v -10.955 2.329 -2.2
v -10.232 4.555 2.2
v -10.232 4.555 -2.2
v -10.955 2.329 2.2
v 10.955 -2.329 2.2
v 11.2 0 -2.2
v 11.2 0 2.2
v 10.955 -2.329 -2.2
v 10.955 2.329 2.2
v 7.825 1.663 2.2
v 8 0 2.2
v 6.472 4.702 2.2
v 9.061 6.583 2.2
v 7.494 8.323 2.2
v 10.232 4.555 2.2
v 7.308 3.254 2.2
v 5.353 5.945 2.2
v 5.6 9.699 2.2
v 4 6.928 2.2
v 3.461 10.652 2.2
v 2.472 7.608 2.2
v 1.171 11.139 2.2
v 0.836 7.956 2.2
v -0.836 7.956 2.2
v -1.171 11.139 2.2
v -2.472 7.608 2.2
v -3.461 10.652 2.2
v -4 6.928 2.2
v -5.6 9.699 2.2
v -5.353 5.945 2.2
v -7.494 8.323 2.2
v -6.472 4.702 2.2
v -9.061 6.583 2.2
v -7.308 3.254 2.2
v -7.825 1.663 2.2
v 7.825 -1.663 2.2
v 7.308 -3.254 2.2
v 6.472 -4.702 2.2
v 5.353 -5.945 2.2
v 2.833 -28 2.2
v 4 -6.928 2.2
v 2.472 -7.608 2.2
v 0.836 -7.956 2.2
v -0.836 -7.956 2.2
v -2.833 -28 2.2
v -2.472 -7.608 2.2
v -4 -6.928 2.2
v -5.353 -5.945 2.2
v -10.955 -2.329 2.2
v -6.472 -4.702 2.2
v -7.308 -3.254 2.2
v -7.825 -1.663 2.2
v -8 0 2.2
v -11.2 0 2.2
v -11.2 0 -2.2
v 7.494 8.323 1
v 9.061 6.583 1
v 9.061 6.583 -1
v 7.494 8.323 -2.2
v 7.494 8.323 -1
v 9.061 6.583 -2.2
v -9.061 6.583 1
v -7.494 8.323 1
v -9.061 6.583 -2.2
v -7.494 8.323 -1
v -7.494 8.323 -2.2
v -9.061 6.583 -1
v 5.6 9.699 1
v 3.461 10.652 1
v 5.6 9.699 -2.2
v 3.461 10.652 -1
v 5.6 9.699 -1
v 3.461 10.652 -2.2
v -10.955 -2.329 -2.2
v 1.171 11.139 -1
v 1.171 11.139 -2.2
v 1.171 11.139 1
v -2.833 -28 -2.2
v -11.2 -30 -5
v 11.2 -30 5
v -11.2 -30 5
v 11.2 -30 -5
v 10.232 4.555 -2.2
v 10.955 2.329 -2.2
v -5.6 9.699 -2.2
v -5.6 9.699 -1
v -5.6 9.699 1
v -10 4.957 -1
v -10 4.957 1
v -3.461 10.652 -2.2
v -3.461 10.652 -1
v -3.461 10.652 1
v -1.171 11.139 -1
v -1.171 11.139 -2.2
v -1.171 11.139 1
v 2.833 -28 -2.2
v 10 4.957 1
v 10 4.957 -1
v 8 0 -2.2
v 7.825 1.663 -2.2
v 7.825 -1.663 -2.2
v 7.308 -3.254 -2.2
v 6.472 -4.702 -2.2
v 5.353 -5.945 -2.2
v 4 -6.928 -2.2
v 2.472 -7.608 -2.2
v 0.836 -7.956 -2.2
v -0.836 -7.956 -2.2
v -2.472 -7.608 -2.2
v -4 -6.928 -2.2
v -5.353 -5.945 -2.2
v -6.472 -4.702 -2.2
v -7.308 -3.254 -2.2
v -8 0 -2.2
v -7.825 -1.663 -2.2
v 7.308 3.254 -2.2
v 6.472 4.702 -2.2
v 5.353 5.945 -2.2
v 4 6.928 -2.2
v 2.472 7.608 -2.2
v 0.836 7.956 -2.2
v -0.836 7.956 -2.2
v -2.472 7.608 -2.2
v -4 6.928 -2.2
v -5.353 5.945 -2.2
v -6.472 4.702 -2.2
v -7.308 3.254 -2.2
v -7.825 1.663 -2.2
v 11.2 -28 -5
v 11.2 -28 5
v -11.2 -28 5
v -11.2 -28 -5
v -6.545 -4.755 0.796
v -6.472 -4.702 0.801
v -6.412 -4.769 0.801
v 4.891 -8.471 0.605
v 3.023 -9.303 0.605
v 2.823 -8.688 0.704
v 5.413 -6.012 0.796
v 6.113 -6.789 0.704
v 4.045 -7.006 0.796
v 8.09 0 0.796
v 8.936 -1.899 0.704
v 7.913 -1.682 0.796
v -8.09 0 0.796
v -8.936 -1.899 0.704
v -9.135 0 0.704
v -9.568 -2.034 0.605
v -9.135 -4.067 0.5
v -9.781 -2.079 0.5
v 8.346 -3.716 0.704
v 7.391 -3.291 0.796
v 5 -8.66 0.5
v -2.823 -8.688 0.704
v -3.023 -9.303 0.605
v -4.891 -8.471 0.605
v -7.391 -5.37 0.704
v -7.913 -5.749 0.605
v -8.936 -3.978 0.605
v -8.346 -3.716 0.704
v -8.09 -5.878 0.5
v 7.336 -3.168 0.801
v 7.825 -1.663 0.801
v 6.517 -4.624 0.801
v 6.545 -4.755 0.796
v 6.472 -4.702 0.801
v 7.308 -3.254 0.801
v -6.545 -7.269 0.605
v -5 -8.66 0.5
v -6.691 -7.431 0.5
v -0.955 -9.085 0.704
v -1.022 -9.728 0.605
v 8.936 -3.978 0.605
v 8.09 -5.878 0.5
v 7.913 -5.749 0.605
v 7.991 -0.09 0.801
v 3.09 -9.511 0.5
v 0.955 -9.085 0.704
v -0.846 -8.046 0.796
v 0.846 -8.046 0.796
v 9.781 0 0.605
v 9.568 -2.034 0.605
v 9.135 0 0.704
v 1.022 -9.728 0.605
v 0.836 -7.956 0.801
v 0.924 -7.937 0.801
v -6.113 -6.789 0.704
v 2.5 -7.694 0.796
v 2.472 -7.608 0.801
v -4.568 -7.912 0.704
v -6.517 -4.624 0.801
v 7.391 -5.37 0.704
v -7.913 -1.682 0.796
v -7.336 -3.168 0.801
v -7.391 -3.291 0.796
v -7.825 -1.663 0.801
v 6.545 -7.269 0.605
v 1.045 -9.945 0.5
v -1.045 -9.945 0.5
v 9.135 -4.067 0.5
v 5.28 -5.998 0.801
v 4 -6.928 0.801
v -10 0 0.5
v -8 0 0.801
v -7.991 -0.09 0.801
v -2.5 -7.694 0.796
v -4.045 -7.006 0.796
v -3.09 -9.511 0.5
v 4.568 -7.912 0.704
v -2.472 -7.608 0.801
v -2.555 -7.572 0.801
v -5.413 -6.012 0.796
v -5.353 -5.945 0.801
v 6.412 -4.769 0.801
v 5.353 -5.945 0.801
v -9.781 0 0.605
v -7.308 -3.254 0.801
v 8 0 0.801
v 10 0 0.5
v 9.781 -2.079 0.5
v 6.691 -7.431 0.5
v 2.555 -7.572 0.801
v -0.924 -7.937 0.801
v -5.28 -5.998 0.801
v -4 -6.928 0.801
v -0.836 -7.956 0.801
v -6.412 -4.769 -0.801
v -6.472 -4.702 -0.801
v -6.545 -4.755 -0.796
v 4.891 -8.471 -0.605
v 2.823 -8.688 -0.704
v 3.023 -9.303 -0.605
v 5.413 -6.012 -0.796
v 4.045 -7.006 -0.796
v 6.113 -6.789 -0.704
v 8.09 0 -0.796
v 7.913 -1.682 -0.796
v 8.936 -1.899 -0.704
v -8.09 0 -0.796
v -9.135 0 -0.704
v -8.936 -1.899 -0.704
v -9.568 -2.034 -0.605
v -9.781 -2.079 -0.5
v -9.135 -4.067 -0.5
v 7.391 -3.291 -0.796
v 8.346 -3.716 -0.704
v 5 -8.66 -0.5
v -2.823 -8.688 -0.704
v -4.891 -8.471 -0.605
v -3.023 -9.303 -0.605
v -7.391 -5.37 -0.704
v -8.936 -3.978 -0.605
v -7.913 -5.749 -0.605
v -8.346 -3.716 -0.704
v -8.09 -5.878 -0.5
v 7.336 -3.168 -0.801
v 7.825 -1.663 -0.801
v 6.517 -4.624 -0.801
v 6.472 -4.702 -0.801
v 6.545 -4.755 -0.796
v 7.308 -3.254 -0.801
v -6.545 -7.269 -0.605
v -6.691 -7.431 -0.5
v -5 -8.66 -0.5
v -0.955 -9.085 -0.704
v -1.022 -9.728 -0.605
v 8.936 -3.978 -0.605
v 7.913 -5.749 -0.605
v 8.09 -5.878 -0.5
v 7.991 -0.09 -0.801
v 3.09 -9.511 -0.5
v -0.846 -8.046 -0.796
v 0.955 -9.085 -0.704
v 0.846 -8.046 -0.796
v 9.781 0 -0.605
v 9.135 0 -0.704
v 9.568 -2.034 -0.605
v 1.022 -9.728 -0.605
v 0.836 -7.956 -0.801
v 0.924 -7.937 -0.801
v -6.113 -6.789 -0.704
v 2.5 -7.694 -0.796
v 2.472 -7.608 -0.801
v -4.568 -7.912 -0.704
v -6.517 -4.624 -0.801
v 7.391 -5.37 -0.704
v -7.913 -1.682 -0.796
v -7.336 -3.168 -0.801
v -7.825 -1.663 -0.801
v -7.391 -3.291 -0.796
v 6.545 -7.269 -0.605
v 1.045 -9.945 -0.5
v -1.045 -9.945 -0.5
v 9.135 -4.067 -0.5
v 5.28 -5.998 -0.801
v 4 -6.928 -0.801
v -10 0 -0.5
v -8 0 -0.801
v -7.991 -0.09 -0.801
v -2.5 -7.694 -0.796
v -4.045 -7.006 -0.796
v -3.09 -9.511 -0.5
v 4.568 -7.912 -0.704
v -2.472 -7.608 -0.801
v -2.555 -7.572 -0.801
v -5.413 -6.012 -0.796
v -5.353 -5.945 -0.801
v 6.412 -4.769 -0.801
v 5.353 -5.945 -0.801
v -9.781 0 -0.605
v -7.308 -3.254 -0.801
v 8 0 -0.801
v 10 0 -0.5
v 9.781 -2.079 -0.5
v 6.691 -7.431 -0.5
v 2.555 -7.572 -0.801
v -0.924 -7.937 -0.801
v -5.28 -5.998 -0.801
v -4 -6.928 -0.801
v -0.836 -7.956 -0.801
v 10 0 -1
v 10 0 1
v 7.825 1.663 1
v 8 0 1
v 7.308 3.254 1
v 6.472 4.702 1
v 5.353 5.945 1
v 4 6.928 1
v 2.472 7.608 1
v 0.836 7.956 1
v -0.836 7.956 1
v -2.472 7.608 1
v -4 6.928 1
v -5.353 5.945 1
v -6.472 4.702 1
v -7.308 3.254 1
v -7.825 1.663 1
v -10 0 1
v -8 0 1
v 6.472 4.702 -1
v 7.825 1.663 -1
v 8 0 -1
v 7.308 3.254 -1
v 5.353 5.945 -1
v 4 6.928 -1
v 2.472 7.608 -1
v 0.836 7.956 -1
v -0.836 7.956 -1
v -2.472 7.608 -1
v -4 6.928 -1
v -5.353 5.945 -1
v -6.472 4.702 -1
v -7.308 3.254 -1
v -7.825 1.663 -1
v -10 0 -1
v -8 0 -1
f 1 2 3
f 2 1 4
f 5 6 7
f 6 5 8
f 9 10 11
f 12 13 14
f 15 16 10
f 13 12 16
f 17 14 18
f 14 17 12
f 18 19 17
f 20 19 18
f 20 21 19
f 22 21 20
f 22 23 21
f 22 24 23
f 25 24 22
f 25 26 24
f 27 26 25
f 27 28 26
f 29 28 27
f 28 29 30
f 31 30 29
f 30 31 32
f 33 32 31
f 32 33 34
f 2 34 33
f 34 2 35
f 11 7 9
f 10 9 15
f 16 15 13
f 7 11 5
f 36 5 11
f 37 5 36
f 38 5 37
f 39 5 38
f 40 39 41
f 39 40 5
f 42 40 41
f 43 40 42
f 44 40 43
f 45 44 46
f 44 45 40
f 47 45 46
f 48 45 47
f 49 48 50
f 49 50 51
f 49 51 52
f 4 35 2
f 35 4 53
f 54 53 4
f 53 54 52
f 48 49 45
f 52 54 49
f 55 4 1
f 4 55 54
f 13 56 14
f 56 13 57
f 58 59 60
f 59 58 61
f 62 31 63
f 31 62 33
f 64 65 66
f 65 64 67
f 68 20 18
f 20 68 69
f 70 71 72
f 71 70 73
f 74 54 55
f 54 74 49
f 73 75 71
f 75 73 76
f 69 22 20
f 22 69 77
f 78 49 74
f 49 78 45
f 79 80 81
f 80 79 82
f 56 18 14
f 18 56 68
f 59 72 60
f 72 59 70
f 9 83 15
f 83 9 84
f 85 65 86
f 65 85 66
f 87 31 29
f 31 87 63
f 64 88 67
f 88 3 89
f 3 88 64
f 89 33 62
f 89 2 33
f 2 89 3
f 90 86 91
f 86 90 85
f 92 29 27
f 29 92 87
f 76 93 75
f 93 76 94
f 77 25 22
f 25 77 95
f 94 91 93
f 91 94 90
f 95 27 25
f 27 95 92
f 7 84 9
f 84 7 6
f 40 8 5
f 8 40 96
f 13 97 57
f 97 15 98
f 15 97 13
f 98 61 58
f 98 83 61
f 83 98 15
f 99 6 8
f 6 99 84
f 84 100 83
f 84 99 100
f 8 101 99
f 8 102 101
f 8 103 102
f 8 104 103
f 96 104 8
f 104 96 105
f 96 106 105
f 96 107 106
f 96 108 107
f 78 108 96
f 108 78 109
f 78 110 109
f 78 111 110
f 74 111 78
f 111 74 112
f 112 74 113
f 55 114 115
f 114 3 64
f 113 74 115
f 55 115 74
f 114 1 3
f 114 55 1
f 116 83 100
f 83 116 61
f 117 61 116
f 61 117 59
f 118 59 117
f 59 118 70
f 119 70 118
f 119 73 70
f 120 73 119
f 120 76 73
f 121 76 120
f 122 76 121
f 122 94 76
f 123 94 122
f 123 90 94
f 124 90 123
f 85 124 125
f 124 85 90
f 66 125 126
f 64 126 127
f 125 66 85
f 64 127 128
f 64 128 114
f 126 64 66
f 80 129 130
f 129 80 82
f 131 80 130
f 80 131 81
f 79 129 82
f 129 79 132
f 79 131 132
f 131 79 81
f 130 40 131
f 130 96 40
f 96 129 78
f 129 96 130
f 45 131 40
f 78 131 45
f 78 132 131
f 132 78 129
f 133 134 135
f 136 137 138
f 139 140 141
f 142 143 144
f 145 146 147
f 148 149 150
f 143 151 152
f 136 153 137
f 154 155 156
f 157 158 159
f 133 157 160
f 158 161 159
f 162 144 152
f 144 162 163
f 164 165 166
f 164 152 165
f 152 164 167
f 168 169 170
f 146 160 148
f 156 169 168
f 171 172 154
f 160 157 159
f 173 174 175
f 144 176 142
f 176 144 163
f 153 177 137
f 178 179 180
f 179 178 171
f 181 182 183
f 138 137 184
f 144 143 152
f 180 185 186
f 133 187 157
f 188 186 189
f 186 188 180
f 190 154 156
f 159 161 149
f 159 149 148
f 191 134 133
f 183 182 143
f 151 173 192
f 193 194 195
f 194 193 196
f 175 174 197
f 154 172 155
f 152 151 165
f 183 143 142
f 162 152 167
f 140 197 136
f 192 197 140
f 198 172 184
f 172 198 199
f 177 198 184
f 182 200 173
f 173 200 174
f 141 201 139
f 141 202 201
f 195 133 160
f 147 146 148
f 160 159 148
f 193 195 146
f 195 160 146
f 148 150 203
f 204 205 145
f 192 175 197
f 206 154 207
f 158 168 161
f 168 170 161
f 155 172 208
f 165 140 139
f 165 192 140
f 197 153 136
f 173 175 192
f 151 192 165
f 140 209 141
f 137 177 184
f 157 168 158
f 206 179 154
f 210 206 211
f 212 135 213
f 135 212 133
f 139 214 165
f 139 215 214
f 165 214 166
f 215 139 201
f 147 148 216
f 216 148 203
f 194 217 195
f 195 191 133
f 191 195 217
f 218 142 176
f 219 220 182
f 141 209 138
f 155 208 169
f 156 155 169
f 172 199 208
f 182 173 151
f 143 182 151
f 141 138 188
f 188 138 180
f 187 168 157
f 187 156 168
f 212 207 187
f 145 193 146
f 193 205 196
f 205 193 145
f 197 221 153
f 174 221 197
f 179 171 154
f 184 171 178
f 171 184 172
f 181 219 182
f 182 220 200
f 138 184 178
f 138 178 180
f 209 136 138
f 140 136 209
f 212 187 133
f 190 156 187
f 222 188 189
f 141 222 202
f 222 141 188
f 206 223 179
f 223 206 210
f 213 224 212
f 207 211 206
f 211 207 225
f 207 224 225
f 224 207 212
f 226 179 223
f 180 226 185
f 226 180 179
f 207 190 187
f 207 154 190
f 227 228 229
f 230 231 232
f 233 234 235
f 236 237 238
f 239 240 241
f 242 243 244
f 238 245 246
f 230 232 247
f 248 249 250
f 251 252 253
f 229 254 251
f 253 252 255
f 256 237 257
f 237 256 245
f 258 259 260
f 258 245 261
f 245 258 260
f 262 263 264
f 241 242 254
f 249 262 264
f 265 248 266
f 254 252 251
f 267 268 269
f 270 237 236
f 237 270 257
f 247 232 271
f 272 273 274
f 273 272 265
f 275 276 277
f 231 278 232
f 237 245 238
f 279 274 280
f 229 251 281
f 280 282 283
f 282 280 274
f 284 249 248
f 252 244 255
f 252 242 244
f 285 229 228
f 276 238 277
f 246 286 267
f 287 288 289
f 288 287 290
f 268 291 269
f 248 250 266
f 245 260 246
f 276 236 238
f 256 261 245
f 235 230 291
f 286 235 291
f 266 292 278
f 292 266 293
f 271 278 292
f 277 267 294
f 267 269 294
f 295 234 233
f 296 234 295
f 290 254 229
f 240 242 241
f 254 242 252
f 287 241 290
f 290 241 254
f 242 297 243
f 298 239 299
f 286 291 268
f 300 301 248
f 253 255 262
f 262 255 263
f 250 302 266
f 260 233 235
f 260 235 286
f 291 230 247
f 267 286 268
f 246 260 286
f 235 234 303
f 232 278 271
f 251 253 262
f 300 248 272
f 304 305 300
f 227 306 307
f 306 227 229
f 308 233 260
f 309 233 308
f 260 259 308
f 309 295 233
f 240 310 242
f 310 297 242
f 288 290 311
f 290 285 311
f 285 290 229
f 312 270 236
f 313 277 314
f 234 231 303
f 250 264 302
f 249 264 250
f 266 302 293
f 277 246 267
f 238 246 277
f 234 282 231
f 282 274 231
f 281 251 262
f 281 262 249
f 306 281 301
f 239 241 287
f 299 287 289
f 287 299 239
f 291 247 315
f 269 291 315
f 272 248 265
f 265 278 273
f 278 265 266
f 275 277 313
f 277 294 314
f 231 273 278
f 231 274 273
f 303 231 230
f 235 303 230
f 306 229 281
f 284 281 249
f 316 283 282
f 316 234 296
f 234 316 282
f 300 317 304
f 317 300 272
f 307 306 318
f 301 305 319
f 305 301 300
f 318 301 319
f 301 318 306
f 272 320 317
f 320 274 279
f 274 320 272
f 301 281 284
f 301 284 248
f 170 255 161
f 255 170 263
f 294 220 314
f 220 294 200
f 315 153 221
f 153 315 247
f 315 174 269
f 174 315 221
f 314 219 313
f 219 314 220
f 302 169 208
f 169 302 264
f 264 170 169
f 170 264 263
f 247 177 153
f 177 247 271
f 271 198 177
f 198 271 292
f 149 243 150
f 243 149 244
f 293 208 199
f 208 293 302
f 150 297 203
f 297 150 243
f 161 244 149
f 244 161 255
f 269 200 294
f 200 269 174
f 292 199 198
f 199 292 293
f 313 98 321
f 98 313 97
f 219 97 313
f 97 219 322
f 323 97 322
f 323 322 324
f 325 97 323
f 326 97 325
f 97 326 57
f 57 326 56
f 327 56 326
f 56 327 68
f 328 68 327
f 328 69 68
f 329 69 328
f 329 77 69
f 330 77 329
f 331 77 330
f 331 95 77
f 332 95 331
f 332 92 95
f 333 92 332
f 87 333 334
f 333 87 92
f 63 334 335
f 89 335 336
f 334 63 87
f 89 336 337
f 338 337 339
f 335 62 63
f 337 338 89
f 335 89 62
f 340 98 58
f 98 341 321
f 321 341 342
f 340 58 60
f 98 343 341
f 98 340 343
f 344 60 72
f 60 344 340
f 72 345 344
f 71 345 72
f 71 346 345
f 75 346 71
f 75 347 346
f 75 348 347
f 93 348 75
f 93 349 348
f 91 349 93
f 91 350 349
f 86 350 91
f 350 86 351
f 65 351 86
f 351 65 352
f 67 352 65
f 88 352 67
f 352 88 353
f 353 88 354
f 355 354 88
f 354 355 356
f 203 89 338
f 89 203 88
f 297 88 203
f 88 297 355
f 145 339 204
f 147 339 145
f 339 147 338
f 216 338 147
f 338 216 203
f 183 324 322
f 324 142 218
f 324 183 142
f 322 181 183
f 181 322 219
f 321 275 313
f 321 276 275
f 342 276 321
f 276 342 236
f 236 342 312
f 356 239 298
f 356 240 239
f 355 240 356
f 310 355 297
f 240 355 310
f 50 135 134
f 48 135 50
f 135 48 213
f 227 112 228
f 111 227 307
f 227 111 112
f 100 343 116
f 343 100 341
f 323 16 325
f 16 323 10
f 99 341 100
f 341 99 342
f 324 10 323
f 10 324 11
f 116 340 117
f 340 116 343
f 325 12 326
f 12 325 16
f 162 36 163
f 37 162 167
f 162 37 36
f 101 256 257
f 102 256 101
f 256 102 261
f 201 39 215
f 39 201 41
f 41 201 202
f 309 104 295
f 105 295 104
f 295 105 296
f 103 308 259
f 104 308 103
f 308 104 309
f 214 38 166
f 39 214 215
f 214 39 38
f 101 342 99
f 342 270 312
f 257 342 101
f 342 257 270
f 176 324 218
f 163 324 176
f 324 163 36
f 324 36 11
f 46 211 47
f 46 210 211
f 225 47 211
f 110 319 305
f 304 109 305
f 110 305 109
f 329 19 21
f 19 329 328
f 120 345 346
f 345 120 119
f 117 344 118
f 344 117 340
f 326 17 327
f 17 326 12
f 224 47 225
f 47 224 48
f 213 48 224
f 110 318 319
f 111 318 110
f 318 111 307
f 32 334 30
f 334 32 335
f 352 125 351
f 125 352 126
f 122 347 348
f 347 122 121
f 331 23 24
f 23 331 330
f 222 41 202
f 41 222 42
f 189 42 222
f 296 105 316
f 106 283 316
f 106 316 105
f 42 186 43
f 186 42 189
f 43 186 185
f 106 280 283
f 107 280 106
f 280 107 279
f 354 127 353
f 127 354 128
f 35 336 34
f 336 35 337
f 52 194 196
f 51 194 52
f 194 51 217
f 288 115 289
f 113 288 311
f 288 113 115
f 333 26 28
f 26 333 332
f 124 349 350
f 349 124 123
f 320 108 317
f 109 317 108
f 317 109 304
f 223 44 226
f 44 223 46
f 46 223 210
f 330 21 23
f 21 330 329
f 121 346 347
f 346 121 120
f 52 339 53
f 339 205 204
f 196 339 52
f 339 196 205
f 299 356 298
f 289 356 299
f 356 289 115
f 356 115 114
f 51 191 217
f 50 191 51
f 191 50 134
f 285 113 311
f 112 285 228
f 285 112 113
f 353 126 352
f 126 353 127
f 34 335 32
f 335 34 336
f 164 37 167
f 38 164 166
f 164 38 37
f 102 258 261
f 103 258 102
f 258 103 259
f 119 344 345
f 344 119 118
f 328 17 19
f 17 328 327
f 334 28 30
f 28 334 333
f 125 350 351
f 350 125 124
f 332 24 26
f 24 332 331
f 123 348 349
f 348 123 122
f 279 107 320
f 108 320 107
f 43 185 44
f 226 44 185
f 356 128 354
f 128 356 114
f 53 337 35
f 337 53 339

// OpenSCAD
$fn = 30;

//height from floor to center of lens
frame_height            = 30;

//frame lens holder dimensions
frame_rim_height        = 3.2;
frame_rim_width         = 1.2;
frame_edge_width        = 1.2;

//foot sizing - foot only gets added when rail == false
foot_height             = 2;
foot_length             = 10;

//lens sizing
lens_diameter           = 20;
lens_rim_width          = 1;
lens_center_width       = 2;

//rail connector - only added when rail == true
rail                    = false;
rail_upper_width        = 12.2;
rail_lower_width        = 4.4;
rail_opening_width      = 4.6;
rail_height             = 4.4; // trapezoid inside rail
rail_handle_height      = 1.8; // on top of trapezoid
rail_minkowski_diameter = 0.36;

//calculate derived dimensions
frame_width     = 2 * frame_rim_width + lens_center_width;
frame_diameter  = lens_diameter +2 * frame_edge_width;
pillar_height   = frame_height - frame_diameter/2;
pillar_width    = frame_width; // only when rail is false


// basic lens shape
module lens(diameter, rim_width, center_width){
    //upper half lens 
    translate([0,0,rim_width/2]){
        intersection(){
            cylinder(h = center_width/2,
                     d1 = diameter,
                     d2 = diameter);
            resize([0,0,center_width - rim_width])
                sphere(d = diameter);
        }
    }
    
    //lower half lens
    mirror([0,0,1]){
        translate([0,0,rim_width/2]){
            intersection(){
                cylinder(h = center_width/2,
                         d1 = diameter,
                         d2 = diameter);
                resize([0,0,center_width - rim_width])
                    sphere(d = diameter);
            }
        }    
    }
    //rim
    cylinder(h = rim_width,
             d1 = diameter,
             d2 = diameter,
             center = true);
}


// main frame
module frame(){
    hull(){
        //pillar
        pillar_offset = (pillar_height - frame_edge_width + frame_diameter)/2;
        translate([0,-pillar_offset,0])
            if (rail == true){
                pillar_width = rail_opening_width; // make sure pillar fits rail
                cube([pillar_width,
                      pillar_height + frame_edge_width,
                      frame_width],
                     center = true);
            } else {
                cube([pillar_width,
                      pillar_height + frame_edge_width,
                      frame_width],
                     center = true);
            }


        //lens frame
        cylinder(h = frame_width,
                 d1 = frame_diameter,
                 d2 = frame_diameter,
                 center = true
                );
    }
    
    if(rail == false) {
        //foot
        foot_offset = frame_height - foot_height/2;
        translate([0,-foot_offset,0])
            cube([frame_diameter,
                  foot_height,
                  foot_length],
                 center=true);
    }
    
    if(rail == true) {
        rail_offset = frame_height + rail_height/2 + rail_handle_height;
        translate([0,-rail_offset,0])
            rail_connector(height = rail_height,
                           length = frame_width,
                           uwidth = rail_upper_width,
                           lwidth = rail_lower_width,
                           owidth = rail_opening_width,
                           hheight = rail_handle_height,
                           md = rail_minkowski_diameter);
    }
}


// lens cutout
module lens_cutout(){
    union(){
        //opening on top for lens insertion
        translate([0,frame_diameter/4,0])
            cube([lens_diameter,
                  frame_diameter/2,
                  lens_center_width],
                  center = true);
        
        //lens cutout
        lens(lens_diameter,
             lens_rim_width,
             lens_center_width);
        
        //openings on the sides
        cylinder(h = frame_width,
                 d1 = lens_diameter - 2 * (frame_rim_height - frame_edge_width),
                 d2 = lens_diameter - 2 * (frame_rim_height - frame_edge_width),
                 center = true);
    }
}




//rail bar connector
module rail_connector(height=4.4, length=5, uwidth=12.2, lwidth=4.4, owidth=4.6, hheight=1.8, md=0.36){
    //handle
    translate([0,hheight/2 + height/2,0])
        cube([owidth, hheight, length], center=true);

    //rail shape
    linear_extrude(length, center=true){
        offset(r = md){
            offset(r = -md){
                polygon(points = [[-lwidth/2,0 -height/2],
                                  [lwidth/2,0 - height/2],
                                  [uwidth/2, height/2],
                                  [-uwidth/2, height/2]],
                                 paths  = [[0,1,2,3]]);
            }
        }
    }
}


// final object
difference(){ 
    frame();
    lens_cutout();
}
